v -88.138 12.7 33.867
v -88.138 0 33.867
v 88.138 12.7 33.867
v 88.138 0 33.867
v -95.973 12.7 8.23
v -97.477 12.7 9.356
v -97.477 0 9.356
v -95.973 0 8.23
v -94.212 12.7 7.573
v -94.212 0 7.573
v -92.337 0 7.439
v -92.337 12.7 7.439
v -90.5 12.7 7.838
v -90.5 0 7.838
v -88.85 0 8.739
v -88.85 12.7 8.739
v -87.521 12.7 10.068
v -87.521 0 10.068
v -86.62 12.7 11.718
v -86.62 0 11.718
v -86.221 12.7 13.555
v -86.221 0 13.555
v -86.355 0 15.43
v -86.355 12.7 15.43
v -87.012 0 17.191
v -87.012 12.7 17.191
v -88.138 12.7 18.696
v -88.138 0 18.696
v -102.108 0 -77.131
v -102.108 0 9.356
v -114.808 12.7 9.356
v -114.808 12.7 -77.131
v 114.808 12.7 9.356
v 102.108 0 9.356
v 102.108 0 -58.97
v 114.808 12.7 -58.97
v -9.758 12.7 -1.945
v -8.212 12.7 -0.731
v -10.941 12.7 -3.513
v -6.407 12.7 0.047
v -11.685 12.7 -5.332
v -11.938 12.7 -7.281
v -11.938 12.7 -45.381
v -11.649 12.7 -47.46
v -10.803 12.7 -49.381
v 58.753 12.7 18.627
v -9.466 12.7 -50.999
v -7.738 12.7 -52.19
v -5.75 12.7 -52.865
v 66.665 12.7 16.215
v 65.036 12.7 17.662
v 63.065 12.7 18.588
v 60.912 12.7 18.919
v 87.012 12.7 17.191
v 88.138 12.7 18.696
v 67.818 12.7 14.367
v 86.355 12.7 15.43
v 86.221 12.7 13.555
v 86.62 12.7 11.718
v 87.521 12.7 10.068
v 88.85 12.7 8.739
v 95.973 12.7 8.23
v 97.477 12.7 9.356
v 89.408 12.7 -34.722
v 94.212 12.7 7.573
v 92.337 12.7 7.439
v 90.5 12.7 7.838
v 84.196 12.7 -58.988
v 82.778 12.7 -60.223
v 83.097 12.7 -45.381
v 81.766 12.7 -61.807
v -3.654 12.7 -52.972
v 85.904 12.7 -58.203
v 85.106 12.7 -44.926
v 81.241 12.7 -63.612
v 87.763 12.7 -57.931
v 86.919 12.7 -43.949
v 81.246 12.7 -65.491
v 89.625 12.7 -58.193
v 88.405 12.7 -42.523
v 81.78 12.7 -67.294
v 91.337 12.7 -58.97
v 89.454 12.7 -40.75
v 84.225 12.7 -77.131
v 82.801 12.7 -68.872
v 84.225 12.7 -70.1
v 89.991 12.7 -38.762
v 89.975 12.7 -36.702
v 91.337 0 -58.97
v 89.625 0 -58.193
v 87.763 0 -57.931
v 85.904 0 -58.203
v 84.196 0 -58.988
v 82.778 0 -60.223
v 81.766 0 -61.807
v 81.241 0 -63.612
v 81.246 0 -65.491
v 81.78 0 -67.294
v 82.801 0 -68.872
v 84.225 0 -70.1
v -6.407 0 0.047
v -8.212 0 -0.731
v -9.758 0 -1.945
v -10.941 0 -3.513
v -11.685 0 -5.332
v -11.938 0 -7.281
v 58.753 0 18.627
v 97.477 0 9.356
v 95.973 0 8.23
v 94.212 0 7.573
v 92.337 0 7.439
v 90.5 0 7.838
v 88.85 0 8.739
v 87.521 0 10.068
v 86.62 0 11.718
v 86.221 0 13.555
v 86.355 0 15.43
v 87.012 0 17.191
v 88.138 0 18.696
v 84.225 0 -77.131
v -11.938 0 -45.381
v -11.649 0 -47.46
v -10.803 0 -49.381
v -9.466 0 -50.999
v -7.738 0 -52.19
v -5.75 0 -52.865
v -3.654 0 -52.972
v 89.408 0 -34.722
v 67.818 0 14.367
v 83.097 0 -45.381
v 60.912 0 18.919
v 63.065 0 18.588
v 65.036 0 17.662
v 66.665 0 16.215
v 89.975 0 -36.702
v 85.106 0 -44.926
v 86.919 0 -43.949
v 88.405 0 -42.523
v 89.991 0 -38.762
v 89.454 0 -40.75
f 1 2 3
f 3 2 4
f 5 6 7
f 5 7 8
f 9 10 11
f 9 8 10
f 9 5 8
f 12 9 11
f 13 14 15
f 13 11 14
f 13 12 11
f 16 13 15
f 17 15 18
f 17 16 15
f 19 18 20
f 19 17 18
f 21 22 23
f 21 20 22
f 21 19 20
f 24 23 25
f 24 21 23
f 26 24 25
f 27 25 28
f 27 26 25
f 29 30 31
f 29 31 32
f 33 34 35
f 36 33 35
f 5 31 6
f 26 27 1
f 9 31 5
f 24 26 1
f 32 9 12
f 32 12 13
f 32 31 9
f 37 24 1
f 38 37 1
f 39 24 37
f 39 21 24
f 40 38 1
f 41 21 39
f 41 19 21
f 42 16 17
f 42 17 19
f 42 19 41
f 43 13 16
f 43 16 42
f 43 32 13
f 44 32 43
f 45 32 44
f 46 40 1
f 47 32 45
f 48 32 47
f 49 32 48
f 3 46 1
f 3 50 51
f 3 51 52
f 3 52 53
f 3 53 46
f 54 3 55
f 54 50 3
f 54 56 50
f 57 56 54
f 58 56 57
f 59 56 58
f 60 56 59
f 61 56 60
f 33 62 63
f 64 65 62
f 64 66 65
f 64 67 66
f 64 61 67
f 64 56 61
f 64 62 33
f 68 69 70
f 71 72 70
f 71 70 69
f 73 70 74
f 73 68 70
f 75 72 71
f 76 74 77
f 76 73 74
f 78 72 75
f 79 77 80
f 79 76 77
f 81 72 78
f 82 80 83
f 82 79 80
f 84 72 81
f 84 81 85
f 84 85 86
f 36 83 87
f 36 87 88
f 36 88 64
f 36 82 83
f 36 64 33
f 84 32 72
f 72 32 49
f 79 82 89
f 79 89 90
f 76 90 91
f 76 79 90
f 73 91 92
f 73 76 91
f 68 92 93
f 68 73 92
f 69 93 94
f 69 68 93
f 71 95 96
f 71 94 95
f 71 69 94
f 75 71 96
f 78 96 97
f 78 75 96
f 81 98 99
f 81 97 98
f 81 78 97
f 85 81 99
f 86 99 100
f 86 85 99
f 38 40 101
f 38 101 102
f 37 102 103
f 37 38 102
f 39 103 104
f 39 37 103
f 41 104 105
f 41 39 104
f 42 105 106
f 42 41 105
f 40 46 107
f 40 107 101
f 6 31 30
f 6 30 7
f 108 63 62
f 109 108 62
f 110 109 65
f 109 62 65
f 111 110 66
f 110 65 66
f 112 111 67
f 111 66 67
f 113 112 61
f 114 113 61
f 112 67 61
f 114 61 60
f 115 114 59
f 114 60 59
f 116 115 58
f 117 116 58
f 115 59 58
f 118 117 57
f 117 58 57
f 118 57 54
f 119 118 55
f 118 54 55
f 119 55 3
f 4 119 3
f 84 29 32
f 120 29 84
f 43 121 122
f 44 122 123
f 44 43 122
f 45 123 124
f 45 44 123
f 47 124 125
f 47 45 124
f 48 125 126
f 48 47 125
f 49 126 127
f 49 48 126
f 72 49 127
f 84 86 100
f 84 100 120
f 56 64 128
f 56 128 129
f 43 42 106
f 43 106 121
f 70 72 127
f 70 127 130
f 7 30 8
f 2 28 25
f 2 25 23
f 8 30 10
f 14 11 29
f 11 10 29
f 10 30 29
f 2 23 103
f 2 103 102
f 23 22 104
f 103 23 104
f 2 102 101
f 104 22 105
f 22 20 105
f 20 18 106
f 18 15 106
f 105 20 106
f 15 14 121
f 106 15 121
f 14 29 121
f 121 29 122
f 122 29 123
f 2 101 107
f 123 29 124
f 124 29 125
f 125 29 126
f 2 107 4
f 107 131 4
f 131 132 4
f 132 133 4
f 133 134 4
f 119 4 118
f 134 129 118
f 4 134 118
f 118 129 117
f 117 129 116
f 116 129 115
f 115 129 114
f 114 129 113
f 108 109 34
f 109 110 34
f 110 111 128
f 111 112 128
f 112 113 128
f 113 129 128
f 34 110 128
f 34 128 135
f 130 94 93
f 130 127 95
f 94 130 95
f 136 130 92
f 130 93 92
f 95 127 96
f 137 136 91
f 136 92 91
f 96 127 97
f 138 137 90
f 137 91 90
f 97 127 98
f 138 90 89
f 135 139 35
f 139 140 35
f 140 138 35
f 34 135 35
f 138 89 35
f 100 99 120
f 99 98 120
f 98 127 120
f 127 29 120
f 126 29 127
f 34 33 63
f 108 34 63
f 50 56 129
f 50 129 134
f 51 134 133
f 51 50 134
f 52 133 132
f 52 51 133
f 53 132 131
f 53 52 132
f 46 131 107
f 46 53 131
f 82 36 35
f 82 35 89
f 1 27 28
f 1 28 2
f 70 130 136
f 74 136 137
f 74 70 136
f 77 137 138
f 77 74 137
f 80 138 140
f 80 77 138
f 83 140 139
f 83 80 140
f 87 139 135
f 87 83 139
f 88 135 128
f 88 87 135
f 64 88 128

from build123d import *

# Parameters (mm, degrees)
SKETCH1_W           = 229.616
SKETCH1_H           = 110.998
BOSS_EXTRUDE1_DEPTH = 12.7
DRAFT1_ANGLE        = -45
CUT_EXTRUDE1_DEPTH  = 139.893248743
CUT_EXTRUDE2_DEPTH  = 139.893248743


with BuildPart() as part:
    # Sketch1 → Boss-Extrude1 (new body)
    with BuildSketch(Plane(origin=(0, 0, 0), x_dir=(1, 0, 0), z_dir=(0, 1, 0))):
        with Locations((0, 21.631847801)):
            Rectangle(SKETCH1_W, SKETCH1_H)
    extrude(amount=BOSS_EXTRUDE1_DEPTH)

    # Draft1
    draft1_faces = [part.faces().sort_by_distance(p)[0] for p in [
        (-114.808, 6.35, -21.631847801),
        (114.808, 6.35, -21.631847801),
    ]]
    draft(draft1_faces, Plane.ZX.offset(12.7), DRAFT1_ANGLE)

    # Sketch2 → Cut-Extrude1 (cut, through all)
    with BuildSketch(Plane(origin=(0, 12.7, 0), x_dir=(1, 0, 0), z_dir=(0, 1, 0))):
        with BuildLine():
            Line((-114.808, -9.356152199), (-97.477466366, -9.356152199))
            ThreePointArc((-97.477466366, -9.356152199), (-88.138, -9.356152199), (-88.138, -18.695618565))
            Line((-88.138, -18.695618565), (-88.138, -33.867152199))
            Line((-88.138, -33.867152199), (-114.808, -33.867152199))
            Line((-114.808, -33.867152199), (-114.808, -9.356152199))
        make_face()
        with BuildLine():
            Line((114.808, -33.867152199), (114.808, -9.356152199))
            Line((114.808, -9.356152199), (97.477466366, -9.356152199))
            ThreePointArc((97.477466366, -9.356152199), (88.138, -9.356152199), (88.138, -18.695618565))
            Line((88.138, -18.695618565), (88.138, -33.867152199))
            Line((88.138, -33.867152199), (114.808, -33.867152199))
        make_face()
        with BuildLine():
            Line((84.224585113, 77.130847801), (114.808, 77.130847801))
            Line((114.808, 77.130847801), (114.808, 58.969847801))
            Line((114.808, 58.969847801), (91.336585113, 58.969847801))
            ThreePointArc((91.336585113, 58.969847801), (82.215723928, 60.978708985), (84.224585113, 70.099570169))
            Line((84.224585113, 70.099570169), (84.224585113, 77.130847801))
        make_face()
    extrude(amount=-CUT_EXTRUDE1_DEPTH, mode=Mode.SUBTRACT)

    # Sketch3 → Cut-Extrude2 (cut, through all)
    with BuildSketch(Plane(origin=(0, 12.7, 0), x_dir=(1, 0, 0), z_dir=(0, 1, 0))):
        with BuildLine():
            Line((-3.65376202, 52.971841669), (83.097055719, 45.380847801))
            ThreePointArc((83.097055719, 45.380847801), (88.989685458, 41.672106593), (89.408, 34.722080728))
            Line((89.408, 34.722080728), (67.818, -14.367006033))
            ThreePointArc((67.818, -14.367006033), (64.083911918, -18.195587555), (58.753320746, -18.627152199))
            Line((58.753320746, -18.627152199), (-6.407496993, -0.047071571))
            ThreePointArc((-6.407496993, -0.047071571), (-10.400202195, 2.69050833), (-11.938, 7.280847801))
            Line((-11.938, 7.280847801), (-11.938, 45.380847801))
            ThreePointArc((-11.938, 45.380847801), (-9.465956225, 50.99893882), (-3.65376202, 52.971841669))
        make_face()
    extrude(amount=-CUT_EXTRUDE2_DEPTH, mode=Mode.SUBTRACT)


solid = part.part
